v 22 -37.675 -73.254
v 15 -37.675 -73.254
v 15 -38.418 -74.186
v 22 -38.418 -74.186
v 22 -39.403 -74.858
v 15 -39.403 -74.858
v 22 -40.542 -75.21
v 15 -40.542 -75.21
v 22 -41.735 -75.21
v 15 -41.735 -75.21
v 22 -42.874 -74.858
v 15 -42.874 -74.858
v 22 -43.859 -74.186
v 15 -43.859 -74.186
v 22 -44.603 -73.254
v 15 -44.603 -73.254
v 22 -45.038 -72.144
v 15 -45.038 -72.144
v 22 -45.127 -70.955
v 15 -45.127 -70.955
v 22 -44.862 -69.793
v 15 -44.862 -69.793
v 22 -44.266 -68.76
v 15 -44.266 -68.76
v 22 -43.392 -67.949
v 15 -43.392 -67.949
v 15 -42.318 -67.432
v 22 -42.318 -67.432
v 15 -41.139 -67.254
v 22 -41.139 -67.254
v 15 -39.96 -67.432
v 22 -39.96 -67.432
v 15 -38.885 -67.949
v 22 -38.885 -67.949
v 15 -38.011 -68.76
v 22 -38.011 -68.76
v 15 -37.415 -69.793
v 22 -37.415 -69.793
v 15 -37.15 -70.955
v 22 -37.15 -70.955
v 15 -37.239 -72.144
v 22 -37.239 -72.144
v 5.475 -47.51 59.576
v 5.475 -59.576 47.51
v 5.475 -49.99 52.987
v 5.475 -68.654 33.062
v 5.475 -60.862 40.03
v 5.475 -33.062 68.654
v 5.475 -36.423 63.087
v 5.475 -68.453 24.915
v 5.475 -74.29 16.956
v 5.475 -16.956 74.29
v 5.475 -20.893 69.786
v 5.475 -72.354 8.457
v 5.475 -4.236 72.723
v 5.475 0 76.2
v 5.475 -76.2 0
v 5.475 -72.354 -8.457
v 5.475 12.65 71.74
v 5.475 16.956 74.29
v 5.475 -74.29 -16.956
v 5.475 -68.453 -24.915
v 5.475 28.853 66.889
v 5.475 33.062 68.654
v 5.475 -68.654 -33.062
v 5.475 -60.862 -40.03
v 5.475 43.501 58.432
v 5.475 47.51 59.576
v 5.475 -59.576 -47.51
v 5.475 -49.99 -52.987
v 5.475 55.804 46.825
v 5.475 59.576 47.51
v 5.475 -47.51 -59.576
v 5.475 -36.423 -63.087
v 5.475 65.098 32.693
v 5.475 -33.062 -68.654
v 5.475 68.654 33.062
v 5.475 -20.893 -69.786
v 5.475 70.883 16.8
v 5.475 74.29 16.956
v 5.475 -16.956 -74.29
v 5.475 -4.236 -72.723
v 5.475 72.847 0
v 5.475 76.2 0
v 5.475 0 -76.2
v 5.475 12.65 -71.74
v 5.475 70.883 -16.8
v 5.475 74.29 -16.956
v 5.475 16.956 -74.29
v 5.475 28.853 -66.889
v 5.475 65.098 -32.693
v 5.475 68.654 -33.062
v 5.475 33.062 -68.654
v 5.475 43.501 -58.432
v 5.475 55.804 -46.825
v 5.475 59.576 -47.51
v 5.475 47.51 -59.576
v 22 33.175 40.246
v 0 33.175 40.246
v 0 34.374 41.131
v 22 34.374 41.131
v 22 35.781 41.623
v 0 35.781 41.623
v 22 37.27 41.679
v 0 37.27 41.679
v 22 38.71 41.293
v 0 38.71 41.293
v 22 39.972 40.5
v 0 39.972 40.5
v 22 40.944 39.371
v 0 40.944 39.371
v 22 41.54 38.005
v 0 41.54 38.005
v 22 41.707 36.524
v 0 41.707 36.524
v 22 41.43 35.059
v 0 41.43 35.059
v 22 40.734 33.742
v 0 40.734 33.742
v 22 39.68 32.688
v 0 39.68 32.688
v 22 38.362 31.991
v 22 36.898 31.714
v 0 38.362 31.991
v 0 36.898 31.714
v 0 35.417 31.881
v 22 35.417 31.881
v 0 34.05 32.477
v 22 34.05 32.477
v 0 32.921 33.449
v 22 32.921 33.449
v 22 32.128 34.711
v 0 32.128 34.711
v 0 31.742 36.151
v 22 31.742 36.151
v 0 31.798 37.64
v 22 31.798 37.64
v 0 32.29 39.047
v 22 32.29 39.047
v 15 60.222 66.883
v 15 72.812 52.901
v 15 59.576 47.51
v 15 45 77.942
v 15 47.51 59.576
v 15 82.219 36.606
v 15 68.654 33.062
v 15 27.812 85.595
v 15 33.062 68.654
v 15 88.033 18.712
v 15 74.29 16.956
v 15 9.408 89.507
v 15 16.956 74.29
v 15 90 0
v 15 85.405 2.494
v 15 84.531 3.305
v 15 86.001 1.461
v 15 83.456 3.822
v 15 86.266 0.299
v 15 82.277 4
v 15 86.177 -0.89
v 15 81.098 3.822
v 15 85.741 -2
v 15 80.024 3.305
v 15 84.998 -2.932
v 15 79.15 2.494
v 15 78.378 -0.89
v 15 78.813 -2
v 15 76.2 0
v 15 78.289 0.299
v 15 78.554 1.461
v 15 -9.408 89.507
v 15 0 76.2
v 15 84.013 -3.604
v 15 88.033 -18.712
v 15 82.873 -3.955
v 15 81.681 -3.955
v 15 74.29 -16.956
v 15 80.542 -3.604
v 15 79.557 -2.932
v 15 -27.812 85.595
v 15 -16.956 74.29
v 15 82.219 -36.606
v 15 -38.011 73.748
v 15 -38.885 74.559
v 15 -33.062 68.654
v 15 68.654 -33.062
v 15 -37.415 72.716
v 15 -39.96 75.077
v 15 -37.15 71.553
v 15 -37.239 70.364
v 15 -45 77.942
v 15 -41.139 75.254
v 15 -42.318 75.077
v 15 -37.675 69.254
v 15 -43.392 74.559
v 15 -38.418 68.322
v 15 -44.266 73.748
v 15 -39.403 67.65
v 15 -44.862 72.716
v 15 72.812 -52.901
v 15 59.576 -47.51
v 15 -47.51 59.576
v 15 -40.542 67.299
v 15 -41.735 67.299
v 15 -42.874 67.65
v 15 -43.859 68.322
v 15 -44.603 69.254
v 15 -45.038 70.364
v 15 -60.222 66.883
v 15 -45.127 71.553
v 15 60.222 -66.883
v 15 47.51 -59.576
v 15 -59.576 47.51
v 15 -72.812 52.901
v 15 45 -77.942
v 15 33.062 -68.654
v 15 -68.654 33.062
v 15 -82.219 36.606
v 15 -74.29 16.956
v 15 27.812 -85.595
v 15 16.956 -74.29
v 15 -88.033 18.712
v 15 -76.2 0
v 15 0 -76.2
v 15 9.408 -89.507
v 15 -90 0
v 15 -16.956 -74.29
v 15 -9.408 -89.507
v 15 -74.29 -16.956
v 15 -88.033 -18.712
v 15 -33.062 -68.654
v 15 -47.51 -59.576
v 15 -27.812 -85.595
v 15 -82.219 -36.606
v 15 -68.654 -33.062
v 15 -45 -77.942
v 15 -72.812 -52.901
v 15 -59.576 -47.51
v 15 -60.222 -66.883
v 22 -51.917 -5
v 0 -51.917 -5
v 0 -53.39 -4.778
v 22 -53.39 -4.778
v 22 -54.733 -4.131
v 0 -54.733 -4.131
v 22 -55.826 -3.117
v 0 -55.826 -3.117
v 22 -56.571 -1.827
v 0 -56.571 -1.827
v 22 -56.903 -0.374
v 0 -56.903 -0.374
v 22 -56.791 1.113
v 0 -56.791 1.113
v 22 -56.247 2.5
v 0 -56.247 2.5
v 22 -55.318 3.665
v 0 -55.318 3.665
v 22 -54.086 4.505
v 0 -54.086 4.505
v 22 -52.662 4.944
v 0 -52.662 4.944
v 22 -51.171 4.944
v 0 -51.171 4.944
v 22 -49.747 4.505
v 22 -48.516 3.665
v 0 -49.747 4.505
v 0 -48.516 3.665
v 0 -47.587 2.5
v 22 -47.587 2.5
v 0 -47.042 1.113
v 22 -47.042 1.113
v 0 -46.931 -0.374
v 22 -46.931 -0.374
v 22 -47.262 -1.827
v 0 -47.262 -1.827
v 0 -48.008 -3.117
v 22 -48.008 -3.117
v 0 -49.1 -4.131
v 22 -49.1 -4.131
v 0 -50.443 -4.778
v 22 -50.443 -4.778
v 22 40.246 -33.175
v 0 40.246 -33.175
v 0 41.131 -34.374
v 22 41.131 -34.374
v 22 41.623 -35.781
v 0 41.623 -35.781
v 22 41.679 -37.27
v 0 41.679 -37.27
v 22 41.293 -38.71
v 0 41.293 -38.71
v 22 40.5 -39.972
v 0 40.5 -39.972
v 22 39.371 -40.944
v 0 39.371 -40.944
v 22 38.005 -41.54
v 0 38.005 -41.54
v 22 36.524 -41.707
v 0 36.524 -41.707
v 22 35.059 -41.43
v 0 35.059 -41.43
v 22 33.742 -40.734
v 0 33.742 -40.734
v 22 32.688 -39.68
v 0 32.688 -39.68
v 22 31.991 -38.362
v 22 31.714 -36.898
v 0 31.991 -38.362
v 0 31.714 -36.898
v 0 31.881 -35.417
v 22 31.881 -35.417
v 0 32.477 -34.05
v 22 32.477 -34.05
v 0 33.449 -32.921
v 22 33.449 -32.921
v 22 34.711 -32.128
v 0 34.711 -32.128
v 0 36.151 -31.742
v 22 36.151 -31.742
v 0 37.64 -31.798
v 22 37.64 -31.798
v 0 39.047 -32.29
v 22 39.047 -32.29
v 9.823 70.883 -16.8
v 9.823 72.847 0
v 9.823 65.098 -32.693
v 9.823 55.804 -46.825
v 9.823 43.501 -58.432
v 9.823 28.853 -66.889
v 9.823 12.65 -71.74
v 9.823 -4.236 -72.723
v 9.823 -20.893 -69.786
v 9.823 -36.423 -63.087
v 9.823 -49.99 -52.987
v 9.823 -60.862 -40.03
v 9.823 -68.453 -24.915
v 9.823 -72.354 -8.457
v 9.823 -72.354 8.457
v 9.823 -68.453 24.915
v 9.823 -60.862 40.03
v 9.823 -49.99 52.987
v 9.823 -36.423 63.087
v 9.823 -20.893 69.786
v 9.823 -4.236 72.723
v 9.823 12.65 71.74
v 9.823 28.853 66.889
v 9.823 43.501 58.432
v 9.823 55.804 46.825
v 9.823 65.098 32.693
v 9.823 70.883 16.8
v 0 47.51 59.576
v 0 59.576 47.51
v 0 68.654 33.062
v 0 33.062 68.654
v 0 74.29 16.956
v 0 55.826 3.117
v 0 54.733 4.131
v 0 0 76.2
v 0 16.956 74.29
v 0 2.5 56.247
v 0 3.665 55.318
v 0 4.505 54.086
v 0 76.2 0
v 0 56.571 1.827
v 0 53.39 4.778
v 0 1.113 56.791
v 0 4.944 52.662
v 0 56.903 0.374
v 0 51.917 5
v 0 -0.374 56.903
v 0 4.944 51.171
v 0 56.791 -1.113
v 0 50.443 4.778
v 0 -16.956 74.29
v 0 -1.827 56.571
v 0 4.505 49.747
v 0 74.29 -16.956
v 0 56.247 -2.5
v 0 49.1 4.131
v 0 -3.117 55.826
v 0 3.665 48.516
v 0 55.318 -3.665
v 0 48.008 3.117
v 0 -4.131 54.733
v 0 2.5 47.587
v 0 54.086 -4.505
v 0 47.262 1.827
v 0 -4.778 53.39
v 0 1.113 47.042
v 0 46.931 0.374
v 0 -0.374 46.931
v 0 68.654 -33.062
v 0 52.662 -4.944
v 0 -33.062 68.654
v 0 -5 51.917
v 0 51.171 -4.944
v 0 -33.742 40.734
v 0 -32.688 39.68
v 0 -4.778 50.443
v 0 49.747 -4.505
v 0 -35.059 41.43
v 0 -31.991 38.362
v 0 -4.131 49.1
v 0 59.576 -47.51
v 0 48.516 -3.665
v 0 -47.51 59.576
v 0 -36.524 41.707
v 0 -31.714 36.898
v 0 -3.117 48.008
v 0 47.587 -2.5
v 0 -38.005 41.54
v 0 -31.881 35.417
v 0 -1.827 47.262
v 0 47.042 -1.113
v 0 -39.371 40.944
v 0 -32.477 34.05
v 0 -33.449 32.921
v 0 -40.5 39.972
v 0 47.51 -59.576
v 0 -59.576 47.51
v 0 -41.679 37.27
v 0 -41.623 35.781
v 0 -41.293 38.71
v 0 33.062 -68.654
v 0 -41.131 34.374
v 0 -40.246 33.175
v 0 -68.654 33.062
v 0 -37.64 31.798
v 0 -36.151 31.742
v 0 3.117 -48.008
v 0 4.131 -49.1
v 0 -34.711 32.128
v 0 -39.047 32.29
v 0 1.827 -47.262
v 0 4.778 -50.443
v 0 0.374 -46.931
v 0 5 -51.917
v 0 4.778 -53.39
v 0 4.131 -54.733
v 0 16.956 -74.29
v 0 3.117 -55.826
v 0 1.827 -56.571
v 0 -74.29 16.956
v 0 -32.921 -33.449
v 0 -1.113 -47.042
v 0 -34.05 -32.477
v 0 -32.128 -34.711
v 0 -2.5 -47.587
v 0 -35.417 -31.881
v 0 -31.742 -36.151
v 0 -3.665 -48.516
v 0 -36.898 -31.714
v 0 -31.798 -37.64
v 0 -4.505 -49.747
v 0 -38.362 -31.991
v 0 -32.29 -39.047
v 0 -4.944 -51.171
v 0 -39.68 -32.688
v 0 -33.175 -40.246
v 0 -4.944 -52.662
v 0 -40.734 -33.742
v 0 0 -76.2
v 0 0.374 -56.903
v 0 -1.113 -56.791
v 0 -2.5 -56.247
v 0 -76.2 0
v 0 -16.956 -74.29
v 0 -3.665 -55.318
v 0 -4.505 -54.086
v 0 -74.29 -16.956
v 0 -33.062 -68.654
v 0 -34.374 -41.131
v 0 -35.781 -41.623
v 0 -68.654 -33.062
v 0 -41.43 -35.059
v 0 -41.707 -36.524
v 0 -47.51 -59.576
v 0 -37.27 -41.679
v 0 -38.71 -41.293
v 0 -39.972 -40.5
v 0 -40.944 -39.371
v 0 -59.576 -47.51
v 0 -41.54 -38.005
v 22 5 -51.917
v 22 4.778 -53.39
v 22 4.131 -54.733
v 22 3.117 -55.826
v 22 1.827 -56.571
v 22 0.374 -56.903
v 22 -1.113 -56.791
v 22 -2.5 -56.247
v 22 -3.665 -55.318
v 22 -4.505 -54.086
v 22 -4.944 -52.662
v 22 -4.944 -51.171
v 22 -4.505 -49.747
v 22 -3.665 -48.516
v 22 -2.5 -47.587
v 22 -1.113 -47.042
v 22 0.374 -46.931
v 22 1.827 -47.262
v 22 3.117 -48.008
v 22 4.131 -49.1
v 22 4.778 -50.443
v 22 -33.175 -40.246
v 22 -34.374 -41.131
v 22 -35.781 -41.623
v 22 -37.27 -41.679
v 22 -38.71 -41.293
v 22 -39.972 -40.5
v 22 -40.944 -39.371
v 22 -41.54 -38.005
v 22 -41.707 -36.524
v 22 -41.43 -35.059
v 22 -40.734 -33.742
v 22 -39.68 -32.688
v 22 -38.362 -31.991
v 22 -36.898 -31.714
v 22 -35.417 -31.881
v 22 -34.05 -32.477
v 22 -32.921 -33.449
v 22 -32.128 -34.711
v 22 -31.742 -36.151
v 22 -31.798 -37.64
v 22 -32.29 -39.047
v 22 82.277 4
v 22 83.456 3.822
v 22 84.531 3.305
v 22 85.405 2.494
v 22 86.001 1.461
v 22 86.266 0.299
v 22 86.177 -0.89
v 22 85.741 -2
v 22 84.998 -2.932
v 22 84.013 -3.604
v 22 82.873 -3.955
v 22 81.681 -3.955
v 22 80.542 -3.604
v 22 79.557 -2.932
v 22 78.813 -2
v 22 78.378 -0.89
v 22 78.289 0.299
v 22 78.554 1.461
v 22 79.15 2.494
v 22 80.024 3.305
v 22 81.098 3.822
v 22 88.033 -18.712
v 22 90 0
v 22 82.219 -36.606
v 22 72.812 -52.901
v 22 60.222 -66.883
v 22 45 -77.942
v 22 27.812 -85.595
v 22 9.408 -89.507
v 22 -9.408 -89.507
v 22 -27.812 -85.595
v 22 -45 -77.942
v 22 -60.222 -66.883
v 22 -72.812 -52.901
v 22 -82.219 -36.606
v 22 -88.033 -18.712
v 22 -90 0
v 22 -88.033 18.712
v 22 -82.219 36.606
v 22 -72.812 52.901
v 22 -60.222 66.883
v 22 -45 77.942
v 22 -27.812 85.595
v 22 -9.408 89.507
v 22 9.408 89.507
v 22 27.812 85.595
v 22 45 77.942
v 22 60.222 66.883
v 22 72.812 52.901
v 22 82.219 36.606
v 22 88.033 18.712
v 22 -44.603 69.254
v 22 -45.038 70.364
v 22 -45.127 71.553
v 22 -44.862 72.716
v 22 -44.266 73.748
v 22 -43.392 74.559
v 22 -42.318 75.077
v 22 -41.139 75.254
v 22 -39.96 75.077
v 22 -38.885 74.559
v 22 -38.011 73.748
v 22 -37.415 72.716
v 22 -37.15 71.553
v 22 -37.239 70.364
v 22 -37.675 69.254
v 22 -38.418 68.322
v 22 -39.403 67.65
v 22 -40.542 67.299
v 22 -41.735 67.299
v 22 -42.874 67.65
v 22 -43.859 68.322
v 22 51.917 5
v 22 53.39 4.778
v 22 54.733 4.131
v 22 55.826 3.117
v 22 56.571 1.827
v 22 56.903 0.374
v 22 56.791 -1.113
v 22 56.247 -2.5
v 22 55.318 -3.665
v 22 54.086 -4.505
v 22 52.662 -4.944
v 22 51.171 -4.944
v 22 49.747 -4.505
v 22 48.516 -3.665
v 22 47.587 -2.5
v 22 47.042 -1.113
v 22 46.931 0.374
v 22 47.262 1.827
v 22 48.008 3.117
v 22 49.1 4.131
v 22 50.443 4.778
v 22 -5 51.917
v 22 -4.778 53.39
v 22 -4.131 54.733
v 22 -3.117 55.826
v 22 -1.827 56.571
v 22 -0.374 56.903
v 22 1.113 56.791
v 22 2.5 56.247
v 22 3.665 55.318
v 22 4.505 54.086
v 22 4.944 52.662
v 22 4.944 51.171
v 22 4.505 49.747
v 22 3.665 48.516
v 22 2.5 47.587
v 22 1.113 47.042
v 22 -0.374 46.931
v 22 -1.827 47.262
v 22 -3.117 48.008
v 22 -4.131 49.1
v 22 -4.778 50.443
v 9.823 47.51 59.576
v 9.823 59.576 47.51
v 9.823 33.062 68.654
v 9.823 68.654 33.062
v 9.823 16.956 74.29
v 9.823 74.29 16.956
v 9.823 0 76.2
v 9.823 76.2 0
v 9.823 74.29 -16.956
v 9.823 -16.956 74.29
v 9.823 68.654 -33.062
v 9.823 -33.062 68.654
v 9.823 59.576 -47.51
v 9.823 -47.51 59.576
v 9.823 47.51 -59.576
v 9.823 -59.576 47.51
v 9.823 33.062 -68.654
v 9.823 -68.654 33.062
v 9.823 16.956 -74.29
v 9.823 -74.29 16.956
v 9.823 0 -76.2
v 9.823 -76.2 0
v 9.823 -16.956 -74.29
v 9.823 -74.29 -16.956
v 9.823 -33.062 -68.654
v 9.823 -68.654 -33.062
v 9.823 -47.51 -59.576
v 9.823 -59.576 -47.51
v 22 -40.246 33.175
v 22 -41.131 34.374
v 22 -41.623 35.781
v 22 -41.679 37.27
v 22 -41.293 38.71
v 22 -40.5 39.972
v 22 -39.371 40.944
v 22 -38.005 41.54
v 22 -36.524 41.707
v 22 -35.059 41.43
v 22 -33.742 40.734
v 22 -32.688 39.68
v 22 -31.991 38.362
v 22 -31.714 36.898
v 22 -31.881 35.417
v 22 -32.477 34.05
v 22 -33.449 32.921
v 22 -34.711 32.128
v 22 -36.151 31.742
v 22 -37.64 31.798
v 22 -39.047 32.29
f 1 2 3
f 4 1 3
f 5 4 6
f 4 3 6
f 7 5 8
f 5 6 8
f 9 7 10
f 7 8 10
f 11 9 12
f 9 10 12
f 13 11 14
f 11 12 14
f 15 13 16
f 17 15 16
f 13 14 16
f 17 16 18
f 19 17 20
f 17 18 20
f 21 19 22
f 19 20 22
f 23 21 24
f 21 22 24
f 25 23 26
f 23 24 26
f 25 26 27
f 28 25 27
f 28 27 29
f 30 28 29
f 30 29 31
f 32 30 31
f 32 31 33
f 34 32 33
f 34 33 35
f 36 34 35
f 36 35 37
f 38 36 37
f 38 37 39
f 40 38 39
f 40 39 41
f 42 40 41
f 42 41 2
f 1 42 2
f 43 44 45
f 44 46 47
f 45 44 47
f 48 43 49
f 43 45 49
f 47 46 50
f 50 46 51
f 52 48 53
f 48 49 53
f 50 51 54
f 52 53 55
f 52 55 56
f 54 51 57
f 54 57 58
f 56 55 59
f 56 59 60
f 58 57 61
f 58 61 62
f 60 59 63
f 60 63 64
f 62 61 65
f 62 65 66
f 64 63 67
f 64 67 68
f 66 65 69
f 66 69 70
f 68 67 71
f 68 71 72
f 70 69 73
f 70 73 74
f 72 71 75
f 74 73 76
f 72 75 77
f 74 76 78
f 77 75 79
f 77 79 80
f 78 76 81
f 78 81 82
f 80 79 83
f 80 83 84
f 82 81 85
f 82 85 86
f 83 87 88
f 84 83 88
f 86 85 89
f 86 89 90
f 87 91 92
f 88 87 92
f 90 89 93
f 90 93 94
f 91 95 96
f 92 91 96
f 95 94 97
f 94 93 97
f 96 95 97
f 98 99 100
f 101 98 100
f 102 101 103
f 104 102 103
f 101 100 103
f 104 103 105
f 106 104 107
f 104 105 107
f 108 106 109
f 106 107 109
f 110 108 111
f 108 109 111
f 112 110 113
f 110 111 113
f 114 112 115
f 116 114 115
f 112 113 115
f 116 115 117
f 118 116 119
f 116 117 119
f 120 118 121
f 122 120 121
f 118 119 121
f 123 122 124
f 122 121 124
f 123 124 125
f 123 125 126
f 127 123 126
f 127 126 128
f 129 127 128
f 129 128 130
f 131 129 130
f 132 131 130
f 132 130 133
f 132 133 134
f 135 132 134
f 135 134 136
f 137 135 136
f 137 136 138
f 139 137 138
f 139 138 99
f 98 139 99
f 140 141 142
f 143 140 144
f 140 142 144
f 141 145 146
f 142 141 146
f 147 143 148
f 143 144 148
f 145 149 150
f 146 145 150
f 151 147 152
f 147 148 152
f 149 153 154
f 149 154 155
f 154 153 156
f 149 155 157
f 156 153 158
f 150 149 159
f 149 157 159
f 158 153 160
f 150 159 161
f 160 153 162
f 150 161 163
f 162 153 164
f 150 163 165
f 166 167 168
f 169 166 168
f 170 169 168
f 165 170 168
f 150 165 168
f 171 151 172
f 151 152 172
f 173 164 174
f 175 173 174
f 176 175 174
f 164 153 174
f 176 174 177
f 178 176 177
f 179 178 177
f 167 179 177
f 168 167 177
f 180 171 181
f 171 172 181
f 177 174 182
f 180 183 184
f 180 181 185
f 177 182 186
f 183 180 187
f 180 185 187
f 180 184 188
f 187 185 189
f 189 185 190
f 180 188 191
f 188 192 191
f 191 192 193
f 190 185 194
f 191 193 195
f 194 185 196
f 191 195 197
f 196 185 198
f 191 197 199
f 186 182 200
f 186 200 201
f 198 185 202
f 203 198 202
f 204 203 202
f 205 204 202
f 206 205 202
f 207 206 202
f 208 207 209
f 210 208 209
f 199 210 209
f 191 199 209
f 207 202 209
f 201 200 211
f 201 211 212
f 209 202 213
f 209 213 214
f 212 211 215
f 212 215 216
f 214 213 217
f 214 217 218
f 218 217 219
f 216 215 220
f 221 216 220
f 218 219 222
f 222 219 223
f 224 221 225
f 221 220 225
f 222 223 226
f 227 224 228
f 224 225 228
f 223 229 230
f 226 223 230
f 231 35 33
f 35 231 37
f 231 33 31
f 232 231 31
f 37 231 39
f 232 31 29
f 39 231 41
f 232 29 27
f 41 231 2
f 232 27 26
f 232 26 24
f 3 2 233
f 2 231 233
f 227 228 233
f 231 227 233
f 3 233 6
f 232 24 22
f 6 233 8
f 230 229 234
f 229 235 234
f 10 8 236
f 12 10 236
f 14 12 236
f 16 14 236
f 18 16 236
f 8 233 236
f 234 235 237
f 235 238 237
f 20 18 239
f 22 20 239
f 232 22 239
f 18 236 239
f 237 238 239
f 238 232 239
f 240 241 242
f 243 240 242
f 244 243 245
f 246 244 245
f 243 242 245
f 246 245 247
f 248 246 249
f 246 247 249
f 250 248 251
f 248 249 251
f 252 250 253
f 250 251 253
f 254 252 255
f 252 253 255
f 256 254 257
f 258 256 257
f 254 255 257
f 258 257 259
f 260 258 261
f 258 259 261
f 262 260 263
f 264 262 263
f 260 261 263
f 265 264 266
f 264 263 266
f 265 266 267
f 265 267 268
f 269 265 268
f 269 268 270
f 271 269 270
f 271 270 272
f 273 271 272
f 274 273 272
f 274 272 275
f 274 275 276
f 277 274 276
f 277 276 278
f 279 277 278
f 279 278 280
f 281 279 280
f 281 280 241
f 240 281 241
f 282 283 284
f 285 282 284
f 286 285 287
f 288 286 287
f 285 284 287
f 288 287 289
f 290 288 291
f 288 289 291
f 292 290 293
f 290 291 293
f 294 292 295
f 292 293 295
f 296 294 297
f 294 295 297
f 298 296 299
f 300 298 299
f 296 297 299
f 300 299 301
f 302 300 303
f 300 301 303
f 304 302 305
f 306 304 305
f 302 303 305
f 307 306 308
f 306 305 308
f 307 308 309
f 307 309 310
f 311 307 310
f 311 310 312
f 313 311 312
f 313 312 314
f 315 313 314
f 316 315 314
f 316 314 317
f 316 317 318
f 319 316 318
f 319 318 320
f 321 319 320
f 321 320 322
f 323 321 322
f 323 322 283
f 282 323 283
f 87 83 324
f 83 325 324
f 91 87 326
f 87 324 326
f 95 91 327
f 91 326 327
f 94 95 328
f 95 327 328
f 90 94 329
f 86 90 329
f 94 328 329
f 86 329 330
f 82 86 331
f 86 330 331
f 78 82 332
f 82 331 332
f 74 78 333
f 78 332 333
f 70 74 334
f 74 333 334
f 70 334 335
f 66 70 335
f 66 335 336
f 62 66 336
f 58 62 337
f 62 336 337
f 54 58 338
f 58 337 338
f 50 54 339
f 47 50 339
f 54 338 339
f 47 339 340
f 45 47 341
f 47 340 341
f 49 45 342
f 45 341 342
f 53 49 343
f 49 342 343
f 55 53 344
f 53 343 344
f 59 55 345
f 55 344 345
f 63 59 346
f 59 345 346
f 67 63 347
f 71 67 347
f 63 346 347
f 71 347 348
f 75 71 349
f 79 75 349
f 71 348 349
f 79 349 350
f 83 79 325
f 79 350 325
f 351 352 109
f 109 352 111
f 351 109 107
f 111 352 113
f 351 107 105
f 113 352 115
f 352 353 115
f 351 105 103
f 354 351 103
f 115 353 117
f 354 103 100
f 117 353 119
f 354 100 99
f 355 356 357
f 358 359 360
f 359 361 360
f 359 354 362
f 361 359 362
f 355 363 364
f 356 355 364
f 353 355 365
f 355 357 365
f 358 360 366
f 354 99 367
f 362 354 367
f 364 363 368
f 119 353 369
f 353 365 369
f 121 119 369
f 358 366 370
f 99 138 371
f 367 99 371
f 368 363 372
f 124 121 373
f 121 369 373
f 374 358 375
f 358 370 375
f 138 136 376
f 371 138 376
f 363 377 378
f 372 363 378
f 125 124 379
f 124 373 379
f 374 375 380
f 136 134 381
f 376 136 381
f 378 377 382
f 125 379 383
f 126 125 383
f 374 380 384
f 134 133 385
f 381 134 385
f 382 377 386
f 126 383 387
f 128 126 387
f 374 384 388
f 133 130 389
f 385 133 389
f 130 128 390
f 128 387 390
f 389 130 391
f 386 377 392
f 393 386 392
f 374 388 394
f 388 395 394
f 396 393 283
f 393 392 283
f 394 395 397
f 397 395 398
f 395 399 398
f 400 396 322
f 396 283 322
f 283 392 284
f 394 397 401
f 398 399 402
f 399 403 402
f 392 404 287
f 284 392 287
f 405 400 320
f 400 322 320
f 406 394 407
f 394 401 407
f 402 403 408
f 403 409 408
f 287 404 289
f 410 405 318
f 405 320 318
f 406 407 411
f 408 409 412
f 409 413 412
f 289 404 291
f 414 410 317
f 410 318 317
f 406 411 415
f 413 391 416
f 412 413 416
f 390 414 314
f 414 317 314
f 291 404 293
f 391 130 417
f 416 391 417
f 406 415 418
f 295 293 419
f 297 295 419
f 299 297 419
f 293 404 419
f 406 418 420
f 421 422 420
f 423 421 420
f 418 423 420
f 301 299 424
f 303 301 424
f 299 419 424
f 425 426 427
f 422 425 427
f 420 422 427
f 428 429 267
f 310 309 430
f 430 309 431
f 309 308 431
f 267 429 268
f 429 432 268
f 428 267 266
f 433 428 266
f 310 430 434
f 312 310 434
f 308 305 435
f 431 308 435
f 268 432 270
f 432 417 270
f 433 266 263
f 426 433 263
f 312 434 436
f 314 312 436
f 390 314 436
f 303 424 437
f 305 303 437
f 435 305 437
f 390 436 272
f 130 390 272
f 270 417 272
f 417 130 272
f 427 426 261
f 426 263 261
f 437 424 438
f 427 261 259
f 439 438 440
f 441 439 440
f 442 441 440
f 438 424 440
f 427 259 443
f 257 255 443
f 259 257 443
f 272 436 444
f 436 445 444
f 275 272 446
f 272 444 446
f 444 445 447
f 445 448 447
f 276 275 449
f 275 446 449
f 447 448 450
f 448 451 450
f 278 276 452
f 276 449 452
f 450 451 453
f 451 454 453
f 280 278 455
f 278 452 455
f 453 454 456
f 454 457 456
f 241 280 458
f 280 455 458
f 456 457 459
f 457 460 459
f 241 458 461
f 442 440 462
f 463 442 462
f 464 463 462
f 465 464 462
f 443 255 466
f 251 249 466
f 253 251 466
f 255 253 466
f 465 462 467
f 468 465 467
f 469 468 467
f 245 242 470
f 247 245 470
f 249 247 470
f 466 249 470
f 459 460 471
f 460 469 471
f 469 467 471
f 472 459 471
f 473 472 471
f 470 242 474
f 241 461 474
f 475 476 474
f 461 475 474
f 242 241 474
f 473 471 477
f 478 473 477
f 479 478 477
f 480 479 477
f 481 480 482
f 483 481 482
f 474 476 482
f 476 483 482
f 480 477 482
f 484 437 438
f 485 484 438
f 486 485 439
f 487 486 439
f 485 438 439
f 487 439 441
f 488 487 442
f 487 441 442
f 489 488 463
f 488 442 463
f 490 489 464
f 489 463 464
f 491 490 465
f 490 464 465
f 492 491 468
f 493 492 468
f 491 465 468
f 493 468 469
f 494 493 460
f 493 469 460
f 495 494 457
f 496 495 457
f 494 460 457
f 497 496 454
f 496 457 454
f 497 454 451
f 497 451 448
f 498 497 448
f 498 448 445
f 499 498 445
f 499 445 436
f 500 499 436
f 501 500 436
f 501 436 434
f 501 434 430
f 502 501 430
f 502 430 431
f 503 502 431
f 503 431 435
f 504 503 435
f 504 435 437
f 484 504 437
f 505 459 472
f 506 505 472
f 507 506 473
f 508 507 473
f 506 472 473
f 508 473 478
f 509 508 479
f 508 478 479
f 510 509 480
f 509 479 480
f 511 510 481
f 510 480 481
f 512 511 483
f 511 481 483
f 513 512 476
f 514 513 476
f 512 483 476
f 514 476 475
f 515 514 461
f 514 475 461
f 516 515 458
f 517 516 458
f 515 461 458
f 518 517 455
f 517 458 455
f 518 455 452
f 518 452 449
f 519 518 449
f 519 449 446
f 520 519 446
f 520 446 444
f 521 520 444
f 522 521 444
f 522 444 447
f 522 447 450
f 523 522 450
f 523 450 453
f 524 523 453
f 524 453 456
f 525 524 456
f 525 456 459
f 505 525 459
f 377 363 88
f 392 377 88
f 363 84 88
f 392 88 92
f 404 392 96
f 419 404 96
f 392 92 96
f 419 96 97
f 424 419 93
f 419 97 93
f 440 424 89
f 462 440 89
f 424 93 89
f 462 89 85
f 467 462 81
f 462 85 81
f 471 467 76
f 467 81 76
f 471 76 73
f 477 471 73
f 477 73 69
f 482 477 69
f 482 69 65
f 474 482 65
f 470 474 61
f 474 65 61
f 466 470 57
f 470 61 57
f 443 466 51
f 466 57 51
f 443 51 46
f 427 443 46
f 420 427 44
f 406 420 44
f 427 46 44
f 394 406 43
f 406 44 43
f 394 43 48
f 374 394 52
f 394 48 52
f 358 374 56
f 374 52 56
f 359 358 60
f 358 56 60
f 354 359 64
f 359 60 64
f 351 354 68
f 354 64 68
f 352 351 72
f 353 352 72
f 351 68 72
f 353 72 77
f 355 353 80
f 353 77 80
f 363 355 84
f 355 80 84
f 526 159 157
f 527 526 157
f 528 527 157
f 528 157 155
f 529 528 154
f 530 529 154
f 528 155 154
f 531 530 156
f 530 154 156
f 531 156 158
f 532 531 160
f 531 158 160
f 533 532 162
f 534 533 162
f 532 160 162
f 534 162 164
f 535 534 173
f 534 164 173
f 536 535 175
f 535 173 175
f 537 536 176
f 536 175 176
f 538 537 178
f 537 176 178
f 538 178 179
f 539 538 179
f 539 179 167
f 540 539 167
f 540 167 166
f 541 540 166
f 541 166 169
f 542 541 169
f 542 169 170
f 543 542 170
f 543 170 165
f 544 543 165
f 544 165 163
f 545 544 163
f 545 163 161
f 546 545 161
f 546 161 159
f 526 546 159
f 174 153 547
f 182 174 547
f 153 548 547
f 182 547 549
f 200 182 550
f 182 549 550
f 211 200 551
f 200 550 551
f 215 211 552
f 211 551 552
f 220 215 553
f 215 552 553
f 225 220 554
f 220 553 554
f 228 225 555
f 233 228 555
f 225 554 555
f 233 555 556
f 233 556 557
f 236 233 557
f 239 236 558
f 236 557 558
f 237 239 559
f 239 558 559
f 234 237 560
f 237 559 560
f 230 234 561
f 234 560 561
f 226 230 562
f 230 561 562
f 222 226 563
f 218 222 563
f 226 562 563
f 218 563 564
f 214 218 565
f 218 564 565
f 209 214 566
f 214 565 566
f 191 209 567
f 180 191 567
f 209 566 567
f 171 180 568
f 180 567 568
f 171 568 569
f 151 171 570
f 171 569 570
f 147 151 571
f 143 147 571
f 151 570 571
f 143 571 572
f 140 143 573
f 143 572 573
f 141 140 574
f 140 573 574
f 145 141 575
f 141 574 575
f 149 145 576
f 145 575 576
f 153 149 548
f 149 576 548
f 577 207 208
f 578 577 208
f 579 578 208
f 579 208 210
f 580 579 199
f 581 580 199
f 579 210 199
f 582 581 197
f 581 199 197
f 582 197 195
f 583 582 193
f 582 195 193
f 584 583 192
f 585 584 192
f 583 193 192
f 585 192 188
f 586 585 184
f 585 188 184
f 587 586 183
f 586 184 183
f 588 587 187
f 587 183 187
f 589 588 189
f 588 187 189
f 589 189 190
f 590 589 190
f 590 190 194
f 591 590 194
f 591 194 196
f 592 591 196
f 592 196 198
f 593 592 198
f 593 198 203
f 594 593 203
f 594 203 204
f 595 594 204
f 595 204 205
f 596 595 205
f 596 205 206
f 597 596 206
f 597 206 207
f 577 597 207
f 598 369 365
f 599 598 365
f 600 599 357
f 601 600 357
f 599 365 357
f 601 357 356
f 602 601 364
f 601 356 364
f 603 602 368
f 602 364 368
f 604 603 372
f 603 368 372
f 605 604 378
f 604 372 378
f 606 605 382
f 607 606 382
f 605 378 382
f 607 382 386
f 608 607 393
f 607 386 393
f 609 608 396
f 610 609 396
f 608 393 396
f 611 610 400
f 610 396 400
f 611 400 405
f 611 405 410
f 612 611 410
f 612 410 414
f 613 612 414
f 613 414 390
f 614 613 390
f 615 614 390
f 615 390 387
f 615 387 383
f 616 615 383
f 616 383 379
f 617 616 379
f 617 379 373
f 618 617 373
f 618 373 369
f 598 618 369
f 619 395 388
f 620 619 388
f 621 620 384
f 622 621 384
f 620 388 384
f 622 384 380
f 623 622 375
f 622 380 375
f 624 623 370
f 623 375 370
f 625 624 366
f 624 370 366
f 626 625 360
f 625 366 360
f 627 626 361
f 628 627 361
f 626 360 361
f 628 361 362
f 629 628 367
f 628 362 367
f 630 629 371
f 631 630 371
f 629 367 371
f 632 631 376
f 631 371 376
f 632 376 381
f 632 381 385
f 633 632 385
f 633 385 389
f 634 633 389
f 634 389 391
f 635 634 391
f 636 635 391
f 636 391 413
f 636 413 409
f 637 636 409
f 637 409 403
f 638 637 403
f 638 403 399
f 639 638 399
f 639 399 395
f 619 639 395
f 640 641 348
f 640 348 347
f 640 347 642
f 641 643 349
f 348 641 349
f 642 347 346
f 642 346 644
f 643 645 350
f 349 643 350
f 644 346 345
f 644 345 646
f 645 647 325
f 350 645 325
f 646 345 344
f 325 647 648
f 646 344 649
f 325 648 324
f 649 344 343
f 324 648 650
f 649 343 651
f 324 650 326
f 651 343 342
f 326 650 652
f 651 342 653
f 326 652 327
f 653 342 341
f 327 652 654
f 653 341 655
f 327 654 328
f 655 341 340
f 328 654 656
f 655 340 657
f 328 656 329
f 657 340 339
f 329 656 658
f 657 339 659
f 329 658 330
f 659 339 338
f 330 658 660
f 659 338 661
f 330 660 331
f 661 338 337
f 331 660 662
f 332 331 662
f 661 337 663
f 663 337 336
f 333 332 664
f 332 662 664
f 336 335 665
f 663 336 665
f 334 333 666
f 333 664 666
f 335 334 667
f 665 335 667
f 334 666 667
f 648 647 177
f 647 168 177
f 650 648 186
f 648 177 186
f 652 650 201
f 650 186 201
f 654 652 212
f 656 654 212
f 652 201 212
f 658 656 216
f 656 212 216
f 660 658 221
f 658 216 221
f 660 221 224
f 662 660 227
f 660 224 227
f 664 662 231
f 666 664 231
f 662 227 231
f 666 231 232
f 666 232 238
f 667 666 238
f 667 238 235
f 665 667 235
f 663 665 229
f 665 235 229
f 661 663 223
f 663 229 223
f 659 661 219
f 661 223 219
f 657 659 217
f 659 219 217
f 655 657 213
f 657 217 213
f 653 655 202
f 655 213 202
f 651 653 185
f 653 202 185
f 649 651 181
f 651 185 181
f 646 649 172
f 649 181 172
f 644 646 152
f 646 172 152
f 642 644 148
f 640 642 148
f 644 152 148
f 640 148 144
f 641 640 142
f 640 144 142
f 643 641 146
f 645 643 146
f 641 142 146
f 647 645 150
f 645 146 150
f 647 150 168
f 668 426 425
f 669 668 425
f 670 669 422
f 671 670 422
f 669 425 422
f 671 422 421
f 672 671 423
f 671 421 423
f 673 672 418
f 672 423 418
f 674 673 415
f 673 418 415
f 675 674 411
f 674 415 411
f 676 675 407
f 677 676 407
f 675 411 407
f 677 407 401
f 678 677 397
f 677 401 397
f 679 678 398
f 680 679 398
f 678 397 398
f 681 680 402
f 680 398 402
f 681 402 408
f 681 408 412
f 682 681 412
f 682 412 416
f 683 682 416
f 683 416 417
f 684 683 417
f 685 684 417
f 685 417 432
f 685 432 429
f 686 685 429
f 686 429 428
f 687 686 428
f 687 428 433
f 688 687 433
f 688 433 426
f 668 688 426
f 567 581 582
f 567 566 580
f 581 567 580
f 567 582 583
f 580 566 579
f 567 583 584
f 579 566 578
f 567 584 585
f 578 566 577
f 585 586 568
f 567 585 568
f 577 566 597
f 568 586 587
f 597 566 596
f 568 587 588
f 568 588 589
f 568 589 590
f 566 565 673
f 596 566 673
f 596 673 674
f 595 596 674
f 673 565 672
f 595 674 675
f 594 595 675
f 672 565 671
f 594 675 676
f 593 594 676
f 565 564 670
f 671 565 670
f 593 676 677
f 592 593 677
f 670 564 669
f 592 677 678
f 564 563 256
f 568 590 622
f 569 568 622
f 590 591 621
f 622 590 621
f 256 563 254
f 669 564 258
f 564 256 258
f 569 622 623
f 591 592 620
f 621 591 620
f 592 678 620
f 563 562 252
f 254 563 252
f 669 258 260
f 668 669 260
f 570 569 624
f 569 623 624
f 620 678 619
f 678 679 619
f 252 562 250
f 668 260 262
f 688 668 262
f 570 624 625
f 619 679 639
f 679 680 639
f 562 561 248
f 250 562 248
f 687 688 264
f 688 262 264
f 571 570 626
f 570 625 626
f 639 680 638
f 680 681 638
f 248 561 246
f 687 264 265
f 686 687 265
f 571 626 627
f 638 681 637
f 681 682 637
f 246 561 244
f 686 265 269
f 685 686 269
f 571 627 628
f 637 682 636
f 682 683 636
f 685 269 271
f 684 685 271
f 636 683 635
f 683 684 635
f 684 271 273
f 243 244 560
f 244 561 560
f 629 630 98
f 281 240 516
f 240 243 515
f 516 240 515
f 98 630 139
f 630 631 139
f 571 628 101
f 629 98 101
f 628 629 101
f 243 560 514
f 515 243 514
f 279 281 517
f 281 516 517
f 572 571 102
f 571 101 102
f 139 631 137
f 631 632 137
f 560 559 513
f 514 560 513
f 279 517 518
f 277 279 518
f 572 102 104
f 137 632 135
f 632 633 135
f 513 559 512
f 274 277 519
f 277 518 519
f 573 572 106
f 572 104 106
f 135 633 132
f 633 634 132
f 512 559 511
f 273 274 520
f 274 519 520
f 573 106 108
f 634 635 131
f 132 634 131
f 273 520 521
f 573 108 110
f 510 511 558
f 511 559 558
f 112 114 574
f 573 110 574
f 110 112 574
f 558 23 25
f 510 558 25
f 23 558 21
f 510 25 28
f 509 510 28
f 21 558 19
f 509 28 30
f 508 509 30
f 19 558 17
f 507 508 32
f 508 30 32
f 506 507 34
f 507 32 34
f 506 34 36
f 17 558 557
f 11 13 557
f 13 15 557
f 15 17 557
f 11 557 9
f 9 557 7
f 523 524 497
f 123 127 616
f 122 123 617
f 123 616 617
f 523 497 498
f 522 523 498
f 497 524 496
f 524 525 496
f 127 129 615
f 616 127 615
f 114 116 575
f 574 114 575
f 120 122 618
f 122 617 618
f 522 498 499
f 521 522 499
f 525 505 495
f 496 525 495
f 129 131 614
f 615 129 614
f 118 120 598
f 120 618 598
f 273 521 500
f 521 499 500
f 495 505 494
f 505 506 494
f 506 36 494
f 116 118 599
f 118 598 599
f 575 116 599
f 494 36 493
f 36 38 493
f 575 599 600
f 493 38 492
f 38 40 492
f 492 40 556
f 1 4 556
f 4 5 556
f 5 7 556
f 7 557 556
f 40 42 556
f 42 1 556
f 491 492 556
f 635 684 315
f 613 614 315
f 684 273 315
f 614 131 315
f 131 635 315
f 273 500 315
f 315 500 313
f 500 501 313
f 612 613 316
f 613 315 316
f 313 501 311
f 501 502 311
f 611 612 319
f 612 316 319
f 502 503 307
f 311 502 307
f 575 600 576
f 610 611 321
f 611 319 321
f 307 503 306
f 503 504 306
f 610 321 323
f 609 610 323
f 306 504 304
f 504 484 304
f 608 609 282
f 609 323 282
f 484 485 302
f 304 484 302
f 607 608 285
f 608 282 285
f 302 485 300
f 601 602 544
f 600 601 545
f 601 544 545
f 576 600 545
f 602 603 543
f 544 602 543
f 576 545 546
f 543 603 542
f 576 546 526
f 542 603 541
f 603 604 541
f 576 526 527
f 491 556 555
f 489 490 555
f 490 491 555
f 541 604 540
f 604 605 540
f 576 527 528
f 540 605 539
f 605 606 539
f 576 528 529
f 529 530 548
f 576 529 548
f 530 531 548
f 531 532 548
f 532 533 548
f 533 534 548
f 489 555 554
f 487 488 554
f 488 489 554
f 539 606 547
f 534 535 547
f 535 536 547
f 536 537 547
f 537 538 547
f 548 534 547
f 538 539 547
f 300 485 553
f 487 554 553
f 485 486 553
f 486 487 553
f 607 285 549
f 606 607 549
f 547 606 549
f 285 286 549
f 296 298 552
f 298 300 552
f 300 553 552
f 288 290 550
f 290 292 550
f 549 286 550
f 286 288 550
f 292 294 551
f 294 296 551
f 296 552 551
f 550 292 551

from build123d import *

# Parameters (mm, degrees)
SKETCH2_R          = 4
CUT_EXTRUDE1_DEPTH = 10
CIRPATTERN1_COUNT  = 3
SKETCH3_R          = 5
CUT_EXTRUDE2_DEPTH = 130.16655914
CIRPATTERN2_COUNT  = 8


with BuildPart() as part:
    # Sketch1 → Revolve1 (revolve)
    with BuildSketch(Plane.XY):
        Polygon((0, 0), (0, 76.2), (5.475419526, 76.2), (5.475419526, 72.846582988), (9.822609824, 72.846582988), (9.822609824, 76.2), (15, 76.2), (15, 90), (22, 90), (22, 0), align=None)
    revolve(axis=Axis((22, 0, 0), (-1, 0, 0)))

    # Sketch2 → Cut-Extrude1 (cut)
    with BuildSketch(Plane.ZY.offset(-15)):
        with Locations((0, 82.277326688)):
            Circle(SKETCH2_R)
    cut_extrude1 = extrude(amount=-CUT_EXTRUDE1_DEPTH, mode=Mode.SUBTRACT)

    # CirPattern1: Cut-Extrude1 ×3 about axis
    cirpattern1_axis = Axis((-80.9, 0, 0), (1, 0, 0))
    for i in range(1, CIRPATTERN1_COUNT):
        add(cut_extrude1.rotate(cirpattern1_axis, i * 360 / CIRPATTERN1_COUNT), mode=Mode.SUBTRACT)

    # Sketch3 → Cut-Extrude2 (cut, through all)
    with BuildSketch(Plane.ZY):
        with Locations((0, 51.916670562)):
            Circle(SKETCH3_R)
    cut_extrude2 = extrude(amount=-CUT_EXTRUDE2_DEPTH, mode=Mode.SUBTRACT)

    # CirPattern2: Cut-Extrude2 ×8 about axis
    cirpattern2_axis = Axis((-80.9, 0, 0), (1, 0, 0))
    for i in range(1, CIRPATTERN2_COUNT):
        add(cut_extrude2.rotate(cirpattern2_axis, i * 360 / CIRPATTERN2_COUNT), mode=Mode.SUBTRACT)


solid = part.part
